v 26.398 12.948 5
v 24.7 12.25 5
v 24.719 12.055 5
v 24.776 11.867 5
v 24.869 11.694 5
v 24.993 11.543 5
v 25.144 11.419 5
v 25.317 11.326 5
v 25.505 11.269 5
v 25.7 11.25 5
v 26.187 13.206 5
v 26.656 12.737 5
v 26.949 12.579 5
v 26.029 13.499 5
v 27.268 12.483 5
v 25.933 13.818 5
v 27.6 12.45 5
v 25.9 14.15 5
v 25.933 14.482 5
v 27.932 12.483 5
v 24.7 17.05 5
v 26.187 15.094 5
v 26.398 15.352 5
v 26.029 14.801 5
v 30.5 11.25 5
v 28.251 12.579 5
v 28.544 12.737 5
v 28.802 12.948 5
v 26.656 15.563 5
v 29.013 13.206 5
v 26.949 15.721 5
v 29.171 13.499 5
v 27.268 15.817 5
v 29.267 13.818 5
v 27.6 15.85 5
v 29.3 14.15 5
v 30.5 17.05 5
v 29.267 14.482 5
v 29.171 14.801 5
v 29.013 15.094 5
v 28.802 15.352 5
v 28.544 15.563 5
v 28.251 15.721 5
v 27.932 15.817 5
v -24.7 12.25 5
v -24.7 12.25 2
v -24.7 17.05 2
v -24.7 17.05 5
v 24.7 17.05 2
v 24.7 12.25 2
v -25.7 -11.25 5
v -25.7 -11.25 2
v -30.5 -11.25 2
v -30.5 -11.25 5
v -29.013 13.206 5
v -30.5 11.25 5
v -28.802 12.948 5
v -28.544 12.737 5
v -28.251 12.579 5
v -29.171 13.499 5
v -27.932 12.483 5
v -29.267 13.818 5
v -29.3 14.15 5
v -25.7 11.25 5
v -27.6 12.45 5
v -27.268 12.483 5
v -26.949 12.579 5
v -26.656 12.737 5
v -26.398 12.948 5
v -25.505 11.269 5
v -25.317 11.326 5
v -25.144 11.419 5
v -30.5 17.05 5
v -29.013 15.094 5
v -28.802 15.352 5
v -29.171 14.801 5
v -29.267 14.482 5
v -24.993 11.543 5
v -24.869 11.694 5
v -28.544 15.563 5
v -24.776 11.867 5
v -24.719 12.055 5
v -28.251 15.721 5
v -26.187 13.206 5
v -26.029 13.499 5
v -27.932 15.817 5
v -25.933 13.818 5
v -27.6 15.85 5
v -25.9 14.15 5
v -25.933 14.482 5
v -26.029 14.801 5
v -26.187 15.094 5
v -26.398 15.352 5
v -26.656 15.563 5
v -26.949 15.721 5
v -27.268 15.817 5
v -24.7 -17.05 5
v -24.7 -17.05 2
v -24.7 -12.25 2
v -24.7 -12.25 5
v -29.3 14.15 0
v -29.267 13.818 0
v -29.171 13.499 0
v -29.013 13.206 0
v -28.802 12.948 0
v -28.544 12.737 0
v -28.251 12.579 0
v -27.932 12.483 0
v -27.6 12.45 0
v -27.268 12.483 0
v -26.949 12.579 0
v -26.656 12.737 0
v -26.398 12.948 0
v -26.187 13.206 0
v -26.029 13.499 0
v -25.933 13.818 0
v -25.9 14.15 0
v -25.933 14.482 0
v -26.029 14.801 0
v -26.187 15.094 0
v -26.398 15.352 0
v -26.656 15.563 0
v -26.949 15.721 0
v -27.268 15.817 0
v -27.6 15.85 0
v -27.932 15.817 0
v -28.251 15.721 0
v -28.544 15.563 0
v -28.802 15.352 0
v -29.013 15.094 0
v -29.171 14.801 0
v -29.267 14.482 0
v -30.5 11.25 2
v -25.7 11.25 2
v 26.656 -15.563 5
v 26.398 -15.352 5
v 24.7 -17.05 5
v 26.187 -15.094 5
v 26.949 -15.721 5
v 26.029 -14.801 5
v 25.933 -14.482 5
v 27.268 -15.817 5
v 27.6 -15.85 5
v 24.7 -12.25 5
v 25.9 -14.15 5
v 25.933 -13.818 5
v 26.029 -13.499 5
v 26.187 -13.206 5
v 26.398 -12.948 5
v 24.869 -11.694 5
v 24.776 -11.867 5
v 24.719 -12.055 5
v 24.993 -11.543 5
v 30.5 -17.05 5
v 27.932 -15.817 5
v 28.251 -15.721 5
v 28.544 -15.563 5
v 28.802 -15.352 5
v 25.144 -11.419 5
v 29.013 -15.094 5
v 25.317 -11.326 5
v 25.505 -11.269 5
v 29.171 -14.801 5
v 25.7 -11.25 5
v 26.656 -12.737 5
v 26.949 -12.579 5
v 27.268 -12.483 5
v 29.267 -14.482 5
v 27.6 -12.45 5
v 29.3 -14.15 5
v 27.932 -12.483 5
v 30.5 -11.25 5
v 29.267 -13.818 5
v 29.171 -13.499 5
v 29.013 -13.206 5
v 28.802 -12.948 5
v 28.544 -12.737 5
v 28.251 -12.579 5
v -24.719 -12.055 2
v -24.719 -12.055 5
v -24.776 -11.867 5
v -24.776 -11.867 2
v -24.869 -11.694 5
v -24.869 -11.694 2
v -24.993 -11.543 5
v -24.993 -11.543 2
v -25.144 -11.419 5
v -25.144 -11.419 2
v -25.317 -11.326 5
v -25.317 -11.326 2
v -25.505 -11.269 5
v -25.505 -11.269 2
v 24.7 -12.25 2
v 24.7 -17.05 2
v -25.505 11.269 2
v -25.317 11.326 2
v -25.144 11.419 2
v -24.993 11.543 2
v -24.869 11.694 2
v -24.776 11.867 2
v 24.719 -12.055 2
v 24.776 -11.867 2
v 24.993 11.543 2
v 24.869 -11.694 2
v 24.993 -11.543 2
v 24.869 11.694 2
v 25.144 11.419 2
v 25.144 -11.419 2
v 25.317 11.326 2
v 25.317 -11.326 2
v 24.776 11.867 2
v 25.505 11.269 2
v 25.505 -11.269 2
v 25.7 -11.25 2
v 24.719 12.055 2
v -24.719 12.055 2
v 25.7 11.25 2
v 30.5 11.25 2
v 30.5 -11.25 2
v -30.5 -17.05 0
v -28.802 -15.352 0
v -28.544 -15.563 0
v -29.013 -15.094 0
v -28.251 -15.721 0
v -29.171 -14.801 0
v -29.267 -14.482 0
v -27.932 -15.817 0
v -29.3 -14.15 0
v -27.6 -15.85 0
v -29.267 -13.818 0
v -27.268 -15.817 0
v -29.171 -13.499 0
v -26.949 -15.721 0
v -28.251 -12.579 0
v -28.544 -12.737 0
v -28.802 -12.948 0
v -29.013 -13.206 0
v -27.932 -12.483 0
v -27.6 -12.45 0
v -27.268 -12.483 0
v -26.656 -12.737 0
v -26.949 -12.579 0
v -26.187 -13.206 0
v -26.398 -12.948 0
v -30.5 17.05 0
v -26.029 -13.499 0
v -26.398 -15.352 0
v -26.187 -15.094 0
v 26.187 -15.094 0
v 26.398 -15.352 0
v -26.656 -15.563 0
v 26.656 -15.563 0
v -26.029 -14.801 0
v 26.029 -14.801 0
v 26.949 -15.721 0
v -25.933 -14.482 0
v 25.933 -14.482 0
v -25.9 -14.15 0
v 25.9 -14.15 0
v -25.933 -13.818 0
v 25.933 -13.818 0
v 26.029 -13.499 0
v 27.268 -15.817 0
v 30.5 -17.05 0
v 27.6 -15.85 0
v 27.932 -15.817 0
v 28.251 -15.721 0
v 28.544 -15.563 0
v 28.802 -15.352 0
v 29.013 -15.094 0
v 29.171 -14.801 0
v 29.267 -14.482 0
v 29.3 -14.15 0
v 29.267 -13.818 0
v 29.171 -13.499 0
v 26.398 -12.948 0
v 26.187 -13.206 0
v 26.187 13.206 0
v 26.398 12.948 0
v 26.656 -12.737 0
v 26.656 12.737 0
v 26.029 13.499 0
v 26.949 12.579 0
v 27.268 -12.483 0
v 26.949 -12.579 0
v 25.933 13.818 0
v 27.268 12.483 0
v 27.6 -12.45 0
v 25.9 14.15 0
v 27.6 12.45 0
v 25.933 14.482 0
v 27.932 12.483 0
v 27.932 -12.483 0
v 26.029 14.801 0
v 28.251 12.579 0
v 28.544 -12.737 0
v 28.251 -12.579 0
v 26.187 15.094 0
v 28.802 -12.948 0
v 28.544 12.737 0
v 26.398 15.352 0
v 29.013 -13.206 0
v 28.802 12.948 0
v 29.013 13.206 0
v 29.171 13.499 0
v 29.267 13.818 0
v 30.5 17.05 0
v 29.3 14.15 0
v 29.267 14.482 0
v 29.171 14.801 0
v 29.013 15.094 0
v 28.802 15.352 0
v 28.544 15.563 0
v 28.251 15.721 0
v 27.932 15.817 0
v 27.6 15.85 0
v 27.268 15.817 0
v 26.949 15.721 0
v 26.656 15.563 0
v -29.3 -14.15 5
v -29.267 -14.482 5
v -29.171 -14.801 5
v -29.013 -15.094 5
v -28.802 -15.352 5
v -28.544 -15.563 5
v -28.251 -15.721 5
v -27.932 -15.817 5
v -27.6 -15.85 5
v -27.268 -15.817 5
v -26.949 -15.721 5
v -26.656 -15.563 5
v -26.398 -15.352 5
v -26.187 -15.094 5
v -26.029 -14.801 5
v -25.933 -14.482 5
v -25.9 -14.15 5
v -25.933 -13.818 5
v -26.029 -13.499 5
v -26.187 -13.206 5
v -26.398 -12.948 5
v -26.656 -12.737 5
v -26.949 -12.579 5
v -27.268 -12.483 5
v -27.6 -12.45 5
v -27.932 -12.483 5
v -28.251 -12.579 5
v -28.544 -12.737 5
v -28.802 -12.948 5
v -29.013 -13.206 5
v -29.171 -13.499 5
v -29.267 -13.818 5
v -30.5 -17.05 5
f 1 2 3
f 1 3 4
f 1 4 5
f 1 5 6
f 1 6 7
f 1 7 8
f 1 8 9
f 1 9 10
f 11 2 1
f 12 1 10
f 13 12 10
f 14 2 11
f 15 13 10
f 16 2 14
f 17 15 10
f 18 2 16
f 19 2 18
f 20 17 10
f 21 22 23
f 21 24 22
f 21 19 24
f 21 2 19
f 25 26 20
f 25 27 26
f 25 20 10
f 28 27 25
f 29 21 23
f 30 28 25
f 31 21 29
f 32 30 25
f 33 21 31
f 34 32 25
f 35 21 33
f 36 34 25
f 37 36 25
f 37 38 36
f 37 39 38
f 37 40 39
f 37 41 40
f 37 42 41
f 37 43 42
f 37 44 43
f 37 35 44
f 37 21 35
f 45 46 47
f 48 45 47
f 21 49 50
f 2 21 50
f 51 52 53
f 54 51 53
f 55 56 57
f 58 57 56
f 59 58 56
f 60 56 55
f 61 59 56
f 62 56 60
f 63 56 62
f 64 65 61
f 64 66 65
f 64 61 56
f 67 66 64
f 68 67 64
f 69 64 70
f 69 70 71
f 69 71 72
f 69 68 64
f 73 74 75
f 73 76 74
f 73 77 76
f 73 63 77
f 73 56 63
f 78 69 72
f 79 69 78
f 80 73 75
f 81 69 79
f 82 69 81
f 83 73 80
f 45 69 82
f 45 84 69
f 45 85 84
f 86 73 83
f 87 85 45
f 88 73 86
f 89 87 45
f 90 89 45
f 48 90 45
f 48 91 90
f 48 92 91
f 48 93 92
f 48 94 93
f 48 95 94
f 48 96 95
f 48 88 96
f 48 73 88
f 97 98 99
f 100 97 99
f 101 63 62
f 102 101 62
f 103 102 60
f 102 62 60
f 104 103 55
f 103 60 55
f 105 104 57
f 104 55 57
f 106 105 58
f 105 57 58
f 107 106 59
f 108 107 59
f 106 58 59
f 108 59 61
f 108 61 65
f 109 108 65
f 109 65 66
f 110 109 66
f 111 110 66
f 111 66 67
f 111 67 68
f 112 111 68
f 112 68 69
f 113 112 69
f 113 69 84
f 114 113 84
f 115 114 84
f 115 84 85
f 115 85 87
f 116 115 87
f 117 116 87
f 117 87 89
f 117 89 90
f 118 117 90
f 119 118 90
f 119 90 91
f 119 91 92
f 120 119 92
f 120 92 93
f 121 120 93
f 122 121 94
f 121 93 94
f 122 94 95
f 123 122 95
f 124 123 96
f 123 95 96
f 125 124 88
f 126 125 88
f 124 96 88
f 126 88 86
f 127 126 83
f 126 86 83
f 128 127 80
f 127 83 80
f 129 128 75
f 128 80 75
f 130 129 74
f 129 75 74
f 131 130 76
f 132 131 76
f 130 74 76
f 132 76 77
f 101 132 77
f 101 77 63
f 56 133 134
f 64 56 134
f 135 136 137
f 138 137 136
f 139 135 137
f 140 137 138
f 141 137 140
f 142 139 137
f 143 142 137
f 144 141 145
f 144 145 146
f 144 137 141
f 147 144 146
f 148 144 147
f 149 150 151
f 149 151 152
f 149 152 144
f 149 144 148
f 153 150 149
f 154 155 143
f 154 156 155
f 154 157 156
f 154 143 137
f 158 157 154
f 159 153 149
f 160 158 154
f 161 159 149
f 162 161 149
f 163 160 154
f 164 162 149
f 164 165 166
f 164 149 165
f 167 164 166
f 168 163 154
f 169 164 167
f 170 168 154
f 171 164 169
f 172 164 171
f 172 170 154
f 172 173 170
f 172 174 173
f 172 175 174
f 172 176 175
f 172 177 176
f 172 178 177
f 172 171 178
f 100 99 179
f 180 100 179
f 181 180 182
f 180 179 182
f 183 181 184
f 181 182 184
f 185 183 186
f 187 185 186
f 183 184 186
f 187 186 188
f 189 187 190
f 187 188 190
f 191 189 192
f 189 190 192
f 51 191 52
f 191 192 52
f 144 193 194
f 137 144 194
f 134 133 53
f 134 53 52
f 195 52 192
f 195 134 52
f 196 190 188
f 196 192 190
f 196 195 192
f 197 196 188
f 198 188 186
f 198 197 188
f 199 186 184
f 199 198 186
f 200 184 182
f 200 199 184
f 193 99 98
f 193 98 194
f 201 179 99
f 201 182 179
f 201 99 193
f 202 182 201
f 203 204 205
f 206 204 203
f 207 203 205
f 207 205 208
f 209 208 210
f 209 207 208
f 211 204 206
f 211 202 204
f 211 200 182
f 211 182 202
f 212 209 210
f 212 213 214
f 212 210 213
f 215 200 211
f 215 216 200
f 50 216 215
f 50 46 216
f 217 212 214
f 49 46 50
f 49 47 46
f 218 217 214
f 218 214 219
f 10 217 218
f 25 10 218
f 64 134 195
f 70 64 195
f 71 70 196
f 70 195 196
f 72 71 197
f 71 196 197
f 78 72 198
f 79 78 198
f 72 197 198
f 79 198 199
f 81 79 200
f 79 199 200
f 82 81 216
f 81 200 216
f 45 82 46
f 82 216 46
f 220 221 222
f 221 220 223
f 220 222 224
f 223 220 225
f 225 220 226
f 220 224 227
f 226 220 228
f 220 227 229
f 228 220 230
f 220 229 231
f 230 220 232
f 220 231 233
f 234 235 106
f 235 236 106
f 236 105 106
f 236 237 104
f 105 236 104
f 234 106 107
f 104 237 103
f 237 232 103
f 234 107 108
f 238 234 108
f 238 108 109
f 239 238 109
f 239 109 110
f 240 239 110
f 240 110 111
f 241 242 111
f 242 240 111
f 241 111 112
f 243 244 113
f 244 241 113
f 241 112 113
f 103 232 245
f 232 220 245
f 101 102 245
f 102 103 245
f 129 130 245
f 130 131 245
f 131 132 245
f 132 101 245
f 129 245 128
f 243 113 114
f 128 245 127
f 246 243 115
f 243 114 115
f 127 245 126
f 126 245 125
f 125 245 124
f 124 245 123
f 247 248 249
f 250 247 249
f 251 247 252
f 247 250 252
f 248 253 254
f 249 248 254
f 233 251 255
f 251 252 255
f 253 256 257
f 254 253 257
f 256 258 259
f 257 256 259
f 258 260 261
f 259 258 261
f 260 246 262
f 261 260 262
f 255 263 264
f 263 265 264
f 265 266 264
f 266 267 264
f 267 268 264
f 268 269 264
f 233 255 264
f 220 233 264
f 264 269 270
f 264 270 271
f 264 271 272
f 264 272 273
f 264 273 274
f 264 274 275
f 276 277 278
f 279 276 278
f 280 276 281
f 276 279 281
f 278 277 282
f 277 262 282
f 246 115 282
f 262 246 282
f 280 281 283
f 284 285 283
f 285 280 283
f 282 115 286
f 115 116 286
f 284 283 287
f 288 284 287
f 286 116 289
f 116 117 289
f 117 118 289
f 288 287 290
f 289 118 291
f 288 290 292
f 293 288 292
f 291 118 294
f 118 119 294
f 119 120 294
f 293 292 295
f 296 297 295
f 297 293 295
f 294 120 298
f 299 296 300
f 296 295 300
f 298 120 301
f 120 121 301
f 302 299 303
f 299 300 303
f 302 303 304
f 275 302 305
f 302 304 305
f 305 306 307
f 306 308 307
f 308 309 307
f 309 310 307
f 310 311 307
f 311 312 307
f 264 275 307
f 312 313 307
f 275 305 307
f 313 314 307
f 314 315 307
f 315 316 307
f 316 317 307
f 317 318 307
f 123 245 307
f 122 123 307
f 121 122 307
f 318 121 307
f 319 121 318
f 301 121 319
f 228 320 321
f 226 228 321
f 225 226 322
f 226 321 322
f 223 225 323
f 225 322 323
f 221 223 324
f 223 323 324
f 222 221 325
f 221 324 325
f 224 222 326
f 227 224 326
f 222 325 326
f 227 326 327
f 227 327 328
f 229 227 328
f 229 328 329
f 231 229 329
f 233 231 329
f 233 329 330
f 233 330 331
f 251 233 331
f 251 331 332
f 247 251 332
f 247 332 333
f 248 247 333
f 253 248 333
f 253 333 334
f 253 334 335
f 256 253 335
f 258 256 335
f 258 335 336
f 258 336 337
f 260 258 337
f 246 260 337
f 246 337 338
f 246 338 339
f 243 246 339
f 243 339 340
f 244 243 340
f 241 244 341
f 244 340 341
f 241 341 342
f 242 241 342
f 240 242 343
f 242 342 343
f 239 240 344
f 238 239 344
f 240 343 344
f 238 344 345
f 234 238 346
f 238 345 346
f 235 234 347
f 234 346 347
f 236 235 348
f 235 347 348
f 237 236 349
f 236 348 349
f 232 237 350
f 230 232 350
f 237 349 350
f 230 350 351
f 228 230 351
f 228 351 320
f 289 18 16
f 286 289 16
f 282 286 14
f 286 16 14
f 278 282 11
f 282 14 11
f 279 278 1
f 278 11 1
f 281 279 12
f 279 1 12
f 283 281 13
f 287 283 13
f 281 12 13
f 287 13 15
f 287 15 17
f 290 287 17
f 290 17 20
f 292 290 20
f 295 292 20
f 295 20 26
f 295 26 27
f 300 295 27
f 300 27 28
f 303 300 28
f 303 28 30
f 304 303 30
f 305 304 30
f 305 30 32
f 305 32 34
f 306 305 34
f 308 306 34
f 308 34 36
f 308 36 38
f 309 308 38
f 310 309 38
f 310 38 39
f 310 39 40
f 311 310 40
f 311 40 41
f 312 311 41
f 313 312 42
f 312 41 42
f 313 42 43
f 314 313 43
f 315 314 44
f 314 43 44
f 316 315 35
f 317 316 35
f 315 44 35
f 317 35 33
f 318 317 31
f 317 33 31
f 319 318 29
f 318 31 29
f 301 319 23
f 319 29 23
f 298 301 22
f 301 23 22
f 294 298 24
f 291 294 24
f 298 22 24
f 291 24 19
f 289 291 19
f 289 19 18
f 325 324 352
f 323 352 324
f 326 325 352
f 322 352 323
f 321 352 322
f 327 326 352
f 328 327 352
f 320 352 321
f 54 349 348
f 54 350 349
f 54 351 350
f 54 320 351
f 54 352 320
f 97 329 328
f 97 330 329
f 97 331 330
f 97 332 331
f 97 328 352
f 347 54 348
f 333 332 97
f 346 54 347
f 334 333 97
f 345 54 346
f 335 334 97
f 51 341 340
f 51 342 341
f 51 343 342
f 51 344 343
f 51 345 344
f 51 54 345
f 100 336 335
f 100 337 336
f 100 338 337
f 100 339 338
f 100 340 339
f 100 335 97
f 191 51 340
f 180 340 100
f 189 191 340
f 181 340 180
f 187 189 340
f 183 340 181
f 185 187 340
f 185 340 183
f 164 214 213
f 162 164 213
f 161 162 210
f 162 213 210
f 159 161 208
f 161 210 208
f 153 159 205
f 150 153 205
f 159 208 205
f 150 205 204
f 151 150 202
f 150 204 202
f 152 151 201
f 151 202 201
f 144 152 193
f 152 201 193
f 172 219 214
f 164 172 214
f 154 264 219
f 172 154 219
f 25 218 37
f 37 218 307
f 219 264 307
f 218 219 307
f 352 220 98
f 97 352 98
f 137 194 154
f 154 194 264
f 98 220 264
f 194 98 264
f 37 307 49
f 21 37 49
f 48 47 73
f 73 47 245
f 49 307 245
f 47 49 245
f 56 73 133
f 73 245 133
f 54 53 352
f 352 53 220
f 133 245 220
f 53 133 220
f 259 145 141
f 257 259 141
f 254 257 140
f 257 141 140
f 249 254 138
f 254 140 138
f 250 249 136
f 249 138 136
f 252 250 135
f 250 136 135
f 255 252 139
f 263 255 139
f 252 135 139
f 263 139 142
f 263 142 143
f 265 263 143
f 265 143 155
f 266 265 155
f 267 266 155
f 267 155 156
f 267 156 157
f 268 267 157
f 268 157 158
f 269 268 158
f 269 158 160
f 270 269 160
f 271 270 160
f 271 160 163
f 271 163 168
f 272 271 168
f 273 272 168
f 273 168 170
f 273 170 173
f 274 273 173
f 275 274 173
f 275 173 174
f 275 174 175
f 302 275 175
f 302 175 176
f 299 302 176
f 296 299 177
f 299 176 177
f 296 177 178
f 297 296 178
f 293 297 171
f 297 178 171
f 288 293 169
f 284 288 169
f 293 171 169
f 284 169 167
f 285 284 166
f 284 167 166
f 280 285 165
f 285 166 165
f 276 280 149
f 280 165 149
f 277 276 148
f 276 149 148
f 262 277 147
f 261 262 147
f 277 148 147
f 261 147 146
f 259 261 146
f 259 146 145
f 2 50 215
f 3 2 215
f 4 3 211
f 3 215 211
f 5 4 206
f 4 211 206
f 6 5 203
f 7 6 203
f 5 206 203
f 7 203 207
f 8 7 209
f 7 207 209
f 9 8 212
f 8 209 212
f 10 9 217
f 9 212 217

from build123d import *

# Parameters (mm, degrees)
F0_W     = 61
F0_H     = 34.1
F1_DEPTH = 2
F3_DEPTH = 3
F4_D     = 3.4


with BuildPart() as f1:
    # F0 (on Top) → F1 (new body)
    with BuildSketch(Plane.XY):
        Rectangle(F0_W, F0_H)
    extrude(amount=F1_DEPTH)

    # F2 (on face) → F3 (join)
    with BuildSketch(Plane.XY.offset(2)):
        with BuildLine():
            Line((-24.7, 17.05), (-30.5, 17.05))
            Line((-30.5, 17.05), (-30.5, 11.25))
            Line((-30.5, 11.25), (-25.7, 11.25))
            ThreePointArc((-25.7, 11.25), (-24.9928932188, 11.5428932188), (-24.7, 12.25))
            Line((-24.7, 12.25), (-24.7, 17.05))
        make_face()
        with BuildLine():
            Line((-25.7, -11.25), (-30.5, -11.25))
            Line((-30.5, -11.25), (-30.5, -17.05))
            Line((-30.5, -17.05), (-24.7, -17.05))
            Line((-24.7, -17.05), (-24.7, -12.25))
            ThreePointArc((-24.7, -12.25), (-24.9928932188, -11.5428932188), (-25.7, -11.25))
        make_face()
        with BuildLine():
            Line((30.5, -17.05), (30.5, -11.25))
            Line((30.5, -11.25), (25.7, -11.25))
            ThreePointArc((25.7, -11.25), (24.9928932188, -11.5428932188), (24.7, -12.25))
            Line((24.7, -12.25), (24.7, -17.05))
            Line((24.7, -17.05), (30.5, -17.05))
        make_face()
        with BuildLine():
            Line((30.5, 17.05), (24.7, 17.05))
            Line((24.7, 17.05), (24.7, 12.25))
            ThreePointArc((24.7, 12.25), (24.9928932188, 11.5428932188), (25.7, 11.25))
            Line((25.7, 11.25), (30.5, 11.25))
            Line((30.5, 11.25), (30.5, 17.05))
        make_face()
    extrude(amount=F3_DEPTH)

    # F4 (through all)
    with Locations(Plane(origin=(0, 0, 0), x_dir=(1, 0, 0), z_dir=(0, 0, -1))):
        with Locations((-27.6, -14.15), (27.6, -14.15), (27.6, 14.15), (-27.6, 14.15)):
            Hole(F4_D / 2)


solid = f1.part
